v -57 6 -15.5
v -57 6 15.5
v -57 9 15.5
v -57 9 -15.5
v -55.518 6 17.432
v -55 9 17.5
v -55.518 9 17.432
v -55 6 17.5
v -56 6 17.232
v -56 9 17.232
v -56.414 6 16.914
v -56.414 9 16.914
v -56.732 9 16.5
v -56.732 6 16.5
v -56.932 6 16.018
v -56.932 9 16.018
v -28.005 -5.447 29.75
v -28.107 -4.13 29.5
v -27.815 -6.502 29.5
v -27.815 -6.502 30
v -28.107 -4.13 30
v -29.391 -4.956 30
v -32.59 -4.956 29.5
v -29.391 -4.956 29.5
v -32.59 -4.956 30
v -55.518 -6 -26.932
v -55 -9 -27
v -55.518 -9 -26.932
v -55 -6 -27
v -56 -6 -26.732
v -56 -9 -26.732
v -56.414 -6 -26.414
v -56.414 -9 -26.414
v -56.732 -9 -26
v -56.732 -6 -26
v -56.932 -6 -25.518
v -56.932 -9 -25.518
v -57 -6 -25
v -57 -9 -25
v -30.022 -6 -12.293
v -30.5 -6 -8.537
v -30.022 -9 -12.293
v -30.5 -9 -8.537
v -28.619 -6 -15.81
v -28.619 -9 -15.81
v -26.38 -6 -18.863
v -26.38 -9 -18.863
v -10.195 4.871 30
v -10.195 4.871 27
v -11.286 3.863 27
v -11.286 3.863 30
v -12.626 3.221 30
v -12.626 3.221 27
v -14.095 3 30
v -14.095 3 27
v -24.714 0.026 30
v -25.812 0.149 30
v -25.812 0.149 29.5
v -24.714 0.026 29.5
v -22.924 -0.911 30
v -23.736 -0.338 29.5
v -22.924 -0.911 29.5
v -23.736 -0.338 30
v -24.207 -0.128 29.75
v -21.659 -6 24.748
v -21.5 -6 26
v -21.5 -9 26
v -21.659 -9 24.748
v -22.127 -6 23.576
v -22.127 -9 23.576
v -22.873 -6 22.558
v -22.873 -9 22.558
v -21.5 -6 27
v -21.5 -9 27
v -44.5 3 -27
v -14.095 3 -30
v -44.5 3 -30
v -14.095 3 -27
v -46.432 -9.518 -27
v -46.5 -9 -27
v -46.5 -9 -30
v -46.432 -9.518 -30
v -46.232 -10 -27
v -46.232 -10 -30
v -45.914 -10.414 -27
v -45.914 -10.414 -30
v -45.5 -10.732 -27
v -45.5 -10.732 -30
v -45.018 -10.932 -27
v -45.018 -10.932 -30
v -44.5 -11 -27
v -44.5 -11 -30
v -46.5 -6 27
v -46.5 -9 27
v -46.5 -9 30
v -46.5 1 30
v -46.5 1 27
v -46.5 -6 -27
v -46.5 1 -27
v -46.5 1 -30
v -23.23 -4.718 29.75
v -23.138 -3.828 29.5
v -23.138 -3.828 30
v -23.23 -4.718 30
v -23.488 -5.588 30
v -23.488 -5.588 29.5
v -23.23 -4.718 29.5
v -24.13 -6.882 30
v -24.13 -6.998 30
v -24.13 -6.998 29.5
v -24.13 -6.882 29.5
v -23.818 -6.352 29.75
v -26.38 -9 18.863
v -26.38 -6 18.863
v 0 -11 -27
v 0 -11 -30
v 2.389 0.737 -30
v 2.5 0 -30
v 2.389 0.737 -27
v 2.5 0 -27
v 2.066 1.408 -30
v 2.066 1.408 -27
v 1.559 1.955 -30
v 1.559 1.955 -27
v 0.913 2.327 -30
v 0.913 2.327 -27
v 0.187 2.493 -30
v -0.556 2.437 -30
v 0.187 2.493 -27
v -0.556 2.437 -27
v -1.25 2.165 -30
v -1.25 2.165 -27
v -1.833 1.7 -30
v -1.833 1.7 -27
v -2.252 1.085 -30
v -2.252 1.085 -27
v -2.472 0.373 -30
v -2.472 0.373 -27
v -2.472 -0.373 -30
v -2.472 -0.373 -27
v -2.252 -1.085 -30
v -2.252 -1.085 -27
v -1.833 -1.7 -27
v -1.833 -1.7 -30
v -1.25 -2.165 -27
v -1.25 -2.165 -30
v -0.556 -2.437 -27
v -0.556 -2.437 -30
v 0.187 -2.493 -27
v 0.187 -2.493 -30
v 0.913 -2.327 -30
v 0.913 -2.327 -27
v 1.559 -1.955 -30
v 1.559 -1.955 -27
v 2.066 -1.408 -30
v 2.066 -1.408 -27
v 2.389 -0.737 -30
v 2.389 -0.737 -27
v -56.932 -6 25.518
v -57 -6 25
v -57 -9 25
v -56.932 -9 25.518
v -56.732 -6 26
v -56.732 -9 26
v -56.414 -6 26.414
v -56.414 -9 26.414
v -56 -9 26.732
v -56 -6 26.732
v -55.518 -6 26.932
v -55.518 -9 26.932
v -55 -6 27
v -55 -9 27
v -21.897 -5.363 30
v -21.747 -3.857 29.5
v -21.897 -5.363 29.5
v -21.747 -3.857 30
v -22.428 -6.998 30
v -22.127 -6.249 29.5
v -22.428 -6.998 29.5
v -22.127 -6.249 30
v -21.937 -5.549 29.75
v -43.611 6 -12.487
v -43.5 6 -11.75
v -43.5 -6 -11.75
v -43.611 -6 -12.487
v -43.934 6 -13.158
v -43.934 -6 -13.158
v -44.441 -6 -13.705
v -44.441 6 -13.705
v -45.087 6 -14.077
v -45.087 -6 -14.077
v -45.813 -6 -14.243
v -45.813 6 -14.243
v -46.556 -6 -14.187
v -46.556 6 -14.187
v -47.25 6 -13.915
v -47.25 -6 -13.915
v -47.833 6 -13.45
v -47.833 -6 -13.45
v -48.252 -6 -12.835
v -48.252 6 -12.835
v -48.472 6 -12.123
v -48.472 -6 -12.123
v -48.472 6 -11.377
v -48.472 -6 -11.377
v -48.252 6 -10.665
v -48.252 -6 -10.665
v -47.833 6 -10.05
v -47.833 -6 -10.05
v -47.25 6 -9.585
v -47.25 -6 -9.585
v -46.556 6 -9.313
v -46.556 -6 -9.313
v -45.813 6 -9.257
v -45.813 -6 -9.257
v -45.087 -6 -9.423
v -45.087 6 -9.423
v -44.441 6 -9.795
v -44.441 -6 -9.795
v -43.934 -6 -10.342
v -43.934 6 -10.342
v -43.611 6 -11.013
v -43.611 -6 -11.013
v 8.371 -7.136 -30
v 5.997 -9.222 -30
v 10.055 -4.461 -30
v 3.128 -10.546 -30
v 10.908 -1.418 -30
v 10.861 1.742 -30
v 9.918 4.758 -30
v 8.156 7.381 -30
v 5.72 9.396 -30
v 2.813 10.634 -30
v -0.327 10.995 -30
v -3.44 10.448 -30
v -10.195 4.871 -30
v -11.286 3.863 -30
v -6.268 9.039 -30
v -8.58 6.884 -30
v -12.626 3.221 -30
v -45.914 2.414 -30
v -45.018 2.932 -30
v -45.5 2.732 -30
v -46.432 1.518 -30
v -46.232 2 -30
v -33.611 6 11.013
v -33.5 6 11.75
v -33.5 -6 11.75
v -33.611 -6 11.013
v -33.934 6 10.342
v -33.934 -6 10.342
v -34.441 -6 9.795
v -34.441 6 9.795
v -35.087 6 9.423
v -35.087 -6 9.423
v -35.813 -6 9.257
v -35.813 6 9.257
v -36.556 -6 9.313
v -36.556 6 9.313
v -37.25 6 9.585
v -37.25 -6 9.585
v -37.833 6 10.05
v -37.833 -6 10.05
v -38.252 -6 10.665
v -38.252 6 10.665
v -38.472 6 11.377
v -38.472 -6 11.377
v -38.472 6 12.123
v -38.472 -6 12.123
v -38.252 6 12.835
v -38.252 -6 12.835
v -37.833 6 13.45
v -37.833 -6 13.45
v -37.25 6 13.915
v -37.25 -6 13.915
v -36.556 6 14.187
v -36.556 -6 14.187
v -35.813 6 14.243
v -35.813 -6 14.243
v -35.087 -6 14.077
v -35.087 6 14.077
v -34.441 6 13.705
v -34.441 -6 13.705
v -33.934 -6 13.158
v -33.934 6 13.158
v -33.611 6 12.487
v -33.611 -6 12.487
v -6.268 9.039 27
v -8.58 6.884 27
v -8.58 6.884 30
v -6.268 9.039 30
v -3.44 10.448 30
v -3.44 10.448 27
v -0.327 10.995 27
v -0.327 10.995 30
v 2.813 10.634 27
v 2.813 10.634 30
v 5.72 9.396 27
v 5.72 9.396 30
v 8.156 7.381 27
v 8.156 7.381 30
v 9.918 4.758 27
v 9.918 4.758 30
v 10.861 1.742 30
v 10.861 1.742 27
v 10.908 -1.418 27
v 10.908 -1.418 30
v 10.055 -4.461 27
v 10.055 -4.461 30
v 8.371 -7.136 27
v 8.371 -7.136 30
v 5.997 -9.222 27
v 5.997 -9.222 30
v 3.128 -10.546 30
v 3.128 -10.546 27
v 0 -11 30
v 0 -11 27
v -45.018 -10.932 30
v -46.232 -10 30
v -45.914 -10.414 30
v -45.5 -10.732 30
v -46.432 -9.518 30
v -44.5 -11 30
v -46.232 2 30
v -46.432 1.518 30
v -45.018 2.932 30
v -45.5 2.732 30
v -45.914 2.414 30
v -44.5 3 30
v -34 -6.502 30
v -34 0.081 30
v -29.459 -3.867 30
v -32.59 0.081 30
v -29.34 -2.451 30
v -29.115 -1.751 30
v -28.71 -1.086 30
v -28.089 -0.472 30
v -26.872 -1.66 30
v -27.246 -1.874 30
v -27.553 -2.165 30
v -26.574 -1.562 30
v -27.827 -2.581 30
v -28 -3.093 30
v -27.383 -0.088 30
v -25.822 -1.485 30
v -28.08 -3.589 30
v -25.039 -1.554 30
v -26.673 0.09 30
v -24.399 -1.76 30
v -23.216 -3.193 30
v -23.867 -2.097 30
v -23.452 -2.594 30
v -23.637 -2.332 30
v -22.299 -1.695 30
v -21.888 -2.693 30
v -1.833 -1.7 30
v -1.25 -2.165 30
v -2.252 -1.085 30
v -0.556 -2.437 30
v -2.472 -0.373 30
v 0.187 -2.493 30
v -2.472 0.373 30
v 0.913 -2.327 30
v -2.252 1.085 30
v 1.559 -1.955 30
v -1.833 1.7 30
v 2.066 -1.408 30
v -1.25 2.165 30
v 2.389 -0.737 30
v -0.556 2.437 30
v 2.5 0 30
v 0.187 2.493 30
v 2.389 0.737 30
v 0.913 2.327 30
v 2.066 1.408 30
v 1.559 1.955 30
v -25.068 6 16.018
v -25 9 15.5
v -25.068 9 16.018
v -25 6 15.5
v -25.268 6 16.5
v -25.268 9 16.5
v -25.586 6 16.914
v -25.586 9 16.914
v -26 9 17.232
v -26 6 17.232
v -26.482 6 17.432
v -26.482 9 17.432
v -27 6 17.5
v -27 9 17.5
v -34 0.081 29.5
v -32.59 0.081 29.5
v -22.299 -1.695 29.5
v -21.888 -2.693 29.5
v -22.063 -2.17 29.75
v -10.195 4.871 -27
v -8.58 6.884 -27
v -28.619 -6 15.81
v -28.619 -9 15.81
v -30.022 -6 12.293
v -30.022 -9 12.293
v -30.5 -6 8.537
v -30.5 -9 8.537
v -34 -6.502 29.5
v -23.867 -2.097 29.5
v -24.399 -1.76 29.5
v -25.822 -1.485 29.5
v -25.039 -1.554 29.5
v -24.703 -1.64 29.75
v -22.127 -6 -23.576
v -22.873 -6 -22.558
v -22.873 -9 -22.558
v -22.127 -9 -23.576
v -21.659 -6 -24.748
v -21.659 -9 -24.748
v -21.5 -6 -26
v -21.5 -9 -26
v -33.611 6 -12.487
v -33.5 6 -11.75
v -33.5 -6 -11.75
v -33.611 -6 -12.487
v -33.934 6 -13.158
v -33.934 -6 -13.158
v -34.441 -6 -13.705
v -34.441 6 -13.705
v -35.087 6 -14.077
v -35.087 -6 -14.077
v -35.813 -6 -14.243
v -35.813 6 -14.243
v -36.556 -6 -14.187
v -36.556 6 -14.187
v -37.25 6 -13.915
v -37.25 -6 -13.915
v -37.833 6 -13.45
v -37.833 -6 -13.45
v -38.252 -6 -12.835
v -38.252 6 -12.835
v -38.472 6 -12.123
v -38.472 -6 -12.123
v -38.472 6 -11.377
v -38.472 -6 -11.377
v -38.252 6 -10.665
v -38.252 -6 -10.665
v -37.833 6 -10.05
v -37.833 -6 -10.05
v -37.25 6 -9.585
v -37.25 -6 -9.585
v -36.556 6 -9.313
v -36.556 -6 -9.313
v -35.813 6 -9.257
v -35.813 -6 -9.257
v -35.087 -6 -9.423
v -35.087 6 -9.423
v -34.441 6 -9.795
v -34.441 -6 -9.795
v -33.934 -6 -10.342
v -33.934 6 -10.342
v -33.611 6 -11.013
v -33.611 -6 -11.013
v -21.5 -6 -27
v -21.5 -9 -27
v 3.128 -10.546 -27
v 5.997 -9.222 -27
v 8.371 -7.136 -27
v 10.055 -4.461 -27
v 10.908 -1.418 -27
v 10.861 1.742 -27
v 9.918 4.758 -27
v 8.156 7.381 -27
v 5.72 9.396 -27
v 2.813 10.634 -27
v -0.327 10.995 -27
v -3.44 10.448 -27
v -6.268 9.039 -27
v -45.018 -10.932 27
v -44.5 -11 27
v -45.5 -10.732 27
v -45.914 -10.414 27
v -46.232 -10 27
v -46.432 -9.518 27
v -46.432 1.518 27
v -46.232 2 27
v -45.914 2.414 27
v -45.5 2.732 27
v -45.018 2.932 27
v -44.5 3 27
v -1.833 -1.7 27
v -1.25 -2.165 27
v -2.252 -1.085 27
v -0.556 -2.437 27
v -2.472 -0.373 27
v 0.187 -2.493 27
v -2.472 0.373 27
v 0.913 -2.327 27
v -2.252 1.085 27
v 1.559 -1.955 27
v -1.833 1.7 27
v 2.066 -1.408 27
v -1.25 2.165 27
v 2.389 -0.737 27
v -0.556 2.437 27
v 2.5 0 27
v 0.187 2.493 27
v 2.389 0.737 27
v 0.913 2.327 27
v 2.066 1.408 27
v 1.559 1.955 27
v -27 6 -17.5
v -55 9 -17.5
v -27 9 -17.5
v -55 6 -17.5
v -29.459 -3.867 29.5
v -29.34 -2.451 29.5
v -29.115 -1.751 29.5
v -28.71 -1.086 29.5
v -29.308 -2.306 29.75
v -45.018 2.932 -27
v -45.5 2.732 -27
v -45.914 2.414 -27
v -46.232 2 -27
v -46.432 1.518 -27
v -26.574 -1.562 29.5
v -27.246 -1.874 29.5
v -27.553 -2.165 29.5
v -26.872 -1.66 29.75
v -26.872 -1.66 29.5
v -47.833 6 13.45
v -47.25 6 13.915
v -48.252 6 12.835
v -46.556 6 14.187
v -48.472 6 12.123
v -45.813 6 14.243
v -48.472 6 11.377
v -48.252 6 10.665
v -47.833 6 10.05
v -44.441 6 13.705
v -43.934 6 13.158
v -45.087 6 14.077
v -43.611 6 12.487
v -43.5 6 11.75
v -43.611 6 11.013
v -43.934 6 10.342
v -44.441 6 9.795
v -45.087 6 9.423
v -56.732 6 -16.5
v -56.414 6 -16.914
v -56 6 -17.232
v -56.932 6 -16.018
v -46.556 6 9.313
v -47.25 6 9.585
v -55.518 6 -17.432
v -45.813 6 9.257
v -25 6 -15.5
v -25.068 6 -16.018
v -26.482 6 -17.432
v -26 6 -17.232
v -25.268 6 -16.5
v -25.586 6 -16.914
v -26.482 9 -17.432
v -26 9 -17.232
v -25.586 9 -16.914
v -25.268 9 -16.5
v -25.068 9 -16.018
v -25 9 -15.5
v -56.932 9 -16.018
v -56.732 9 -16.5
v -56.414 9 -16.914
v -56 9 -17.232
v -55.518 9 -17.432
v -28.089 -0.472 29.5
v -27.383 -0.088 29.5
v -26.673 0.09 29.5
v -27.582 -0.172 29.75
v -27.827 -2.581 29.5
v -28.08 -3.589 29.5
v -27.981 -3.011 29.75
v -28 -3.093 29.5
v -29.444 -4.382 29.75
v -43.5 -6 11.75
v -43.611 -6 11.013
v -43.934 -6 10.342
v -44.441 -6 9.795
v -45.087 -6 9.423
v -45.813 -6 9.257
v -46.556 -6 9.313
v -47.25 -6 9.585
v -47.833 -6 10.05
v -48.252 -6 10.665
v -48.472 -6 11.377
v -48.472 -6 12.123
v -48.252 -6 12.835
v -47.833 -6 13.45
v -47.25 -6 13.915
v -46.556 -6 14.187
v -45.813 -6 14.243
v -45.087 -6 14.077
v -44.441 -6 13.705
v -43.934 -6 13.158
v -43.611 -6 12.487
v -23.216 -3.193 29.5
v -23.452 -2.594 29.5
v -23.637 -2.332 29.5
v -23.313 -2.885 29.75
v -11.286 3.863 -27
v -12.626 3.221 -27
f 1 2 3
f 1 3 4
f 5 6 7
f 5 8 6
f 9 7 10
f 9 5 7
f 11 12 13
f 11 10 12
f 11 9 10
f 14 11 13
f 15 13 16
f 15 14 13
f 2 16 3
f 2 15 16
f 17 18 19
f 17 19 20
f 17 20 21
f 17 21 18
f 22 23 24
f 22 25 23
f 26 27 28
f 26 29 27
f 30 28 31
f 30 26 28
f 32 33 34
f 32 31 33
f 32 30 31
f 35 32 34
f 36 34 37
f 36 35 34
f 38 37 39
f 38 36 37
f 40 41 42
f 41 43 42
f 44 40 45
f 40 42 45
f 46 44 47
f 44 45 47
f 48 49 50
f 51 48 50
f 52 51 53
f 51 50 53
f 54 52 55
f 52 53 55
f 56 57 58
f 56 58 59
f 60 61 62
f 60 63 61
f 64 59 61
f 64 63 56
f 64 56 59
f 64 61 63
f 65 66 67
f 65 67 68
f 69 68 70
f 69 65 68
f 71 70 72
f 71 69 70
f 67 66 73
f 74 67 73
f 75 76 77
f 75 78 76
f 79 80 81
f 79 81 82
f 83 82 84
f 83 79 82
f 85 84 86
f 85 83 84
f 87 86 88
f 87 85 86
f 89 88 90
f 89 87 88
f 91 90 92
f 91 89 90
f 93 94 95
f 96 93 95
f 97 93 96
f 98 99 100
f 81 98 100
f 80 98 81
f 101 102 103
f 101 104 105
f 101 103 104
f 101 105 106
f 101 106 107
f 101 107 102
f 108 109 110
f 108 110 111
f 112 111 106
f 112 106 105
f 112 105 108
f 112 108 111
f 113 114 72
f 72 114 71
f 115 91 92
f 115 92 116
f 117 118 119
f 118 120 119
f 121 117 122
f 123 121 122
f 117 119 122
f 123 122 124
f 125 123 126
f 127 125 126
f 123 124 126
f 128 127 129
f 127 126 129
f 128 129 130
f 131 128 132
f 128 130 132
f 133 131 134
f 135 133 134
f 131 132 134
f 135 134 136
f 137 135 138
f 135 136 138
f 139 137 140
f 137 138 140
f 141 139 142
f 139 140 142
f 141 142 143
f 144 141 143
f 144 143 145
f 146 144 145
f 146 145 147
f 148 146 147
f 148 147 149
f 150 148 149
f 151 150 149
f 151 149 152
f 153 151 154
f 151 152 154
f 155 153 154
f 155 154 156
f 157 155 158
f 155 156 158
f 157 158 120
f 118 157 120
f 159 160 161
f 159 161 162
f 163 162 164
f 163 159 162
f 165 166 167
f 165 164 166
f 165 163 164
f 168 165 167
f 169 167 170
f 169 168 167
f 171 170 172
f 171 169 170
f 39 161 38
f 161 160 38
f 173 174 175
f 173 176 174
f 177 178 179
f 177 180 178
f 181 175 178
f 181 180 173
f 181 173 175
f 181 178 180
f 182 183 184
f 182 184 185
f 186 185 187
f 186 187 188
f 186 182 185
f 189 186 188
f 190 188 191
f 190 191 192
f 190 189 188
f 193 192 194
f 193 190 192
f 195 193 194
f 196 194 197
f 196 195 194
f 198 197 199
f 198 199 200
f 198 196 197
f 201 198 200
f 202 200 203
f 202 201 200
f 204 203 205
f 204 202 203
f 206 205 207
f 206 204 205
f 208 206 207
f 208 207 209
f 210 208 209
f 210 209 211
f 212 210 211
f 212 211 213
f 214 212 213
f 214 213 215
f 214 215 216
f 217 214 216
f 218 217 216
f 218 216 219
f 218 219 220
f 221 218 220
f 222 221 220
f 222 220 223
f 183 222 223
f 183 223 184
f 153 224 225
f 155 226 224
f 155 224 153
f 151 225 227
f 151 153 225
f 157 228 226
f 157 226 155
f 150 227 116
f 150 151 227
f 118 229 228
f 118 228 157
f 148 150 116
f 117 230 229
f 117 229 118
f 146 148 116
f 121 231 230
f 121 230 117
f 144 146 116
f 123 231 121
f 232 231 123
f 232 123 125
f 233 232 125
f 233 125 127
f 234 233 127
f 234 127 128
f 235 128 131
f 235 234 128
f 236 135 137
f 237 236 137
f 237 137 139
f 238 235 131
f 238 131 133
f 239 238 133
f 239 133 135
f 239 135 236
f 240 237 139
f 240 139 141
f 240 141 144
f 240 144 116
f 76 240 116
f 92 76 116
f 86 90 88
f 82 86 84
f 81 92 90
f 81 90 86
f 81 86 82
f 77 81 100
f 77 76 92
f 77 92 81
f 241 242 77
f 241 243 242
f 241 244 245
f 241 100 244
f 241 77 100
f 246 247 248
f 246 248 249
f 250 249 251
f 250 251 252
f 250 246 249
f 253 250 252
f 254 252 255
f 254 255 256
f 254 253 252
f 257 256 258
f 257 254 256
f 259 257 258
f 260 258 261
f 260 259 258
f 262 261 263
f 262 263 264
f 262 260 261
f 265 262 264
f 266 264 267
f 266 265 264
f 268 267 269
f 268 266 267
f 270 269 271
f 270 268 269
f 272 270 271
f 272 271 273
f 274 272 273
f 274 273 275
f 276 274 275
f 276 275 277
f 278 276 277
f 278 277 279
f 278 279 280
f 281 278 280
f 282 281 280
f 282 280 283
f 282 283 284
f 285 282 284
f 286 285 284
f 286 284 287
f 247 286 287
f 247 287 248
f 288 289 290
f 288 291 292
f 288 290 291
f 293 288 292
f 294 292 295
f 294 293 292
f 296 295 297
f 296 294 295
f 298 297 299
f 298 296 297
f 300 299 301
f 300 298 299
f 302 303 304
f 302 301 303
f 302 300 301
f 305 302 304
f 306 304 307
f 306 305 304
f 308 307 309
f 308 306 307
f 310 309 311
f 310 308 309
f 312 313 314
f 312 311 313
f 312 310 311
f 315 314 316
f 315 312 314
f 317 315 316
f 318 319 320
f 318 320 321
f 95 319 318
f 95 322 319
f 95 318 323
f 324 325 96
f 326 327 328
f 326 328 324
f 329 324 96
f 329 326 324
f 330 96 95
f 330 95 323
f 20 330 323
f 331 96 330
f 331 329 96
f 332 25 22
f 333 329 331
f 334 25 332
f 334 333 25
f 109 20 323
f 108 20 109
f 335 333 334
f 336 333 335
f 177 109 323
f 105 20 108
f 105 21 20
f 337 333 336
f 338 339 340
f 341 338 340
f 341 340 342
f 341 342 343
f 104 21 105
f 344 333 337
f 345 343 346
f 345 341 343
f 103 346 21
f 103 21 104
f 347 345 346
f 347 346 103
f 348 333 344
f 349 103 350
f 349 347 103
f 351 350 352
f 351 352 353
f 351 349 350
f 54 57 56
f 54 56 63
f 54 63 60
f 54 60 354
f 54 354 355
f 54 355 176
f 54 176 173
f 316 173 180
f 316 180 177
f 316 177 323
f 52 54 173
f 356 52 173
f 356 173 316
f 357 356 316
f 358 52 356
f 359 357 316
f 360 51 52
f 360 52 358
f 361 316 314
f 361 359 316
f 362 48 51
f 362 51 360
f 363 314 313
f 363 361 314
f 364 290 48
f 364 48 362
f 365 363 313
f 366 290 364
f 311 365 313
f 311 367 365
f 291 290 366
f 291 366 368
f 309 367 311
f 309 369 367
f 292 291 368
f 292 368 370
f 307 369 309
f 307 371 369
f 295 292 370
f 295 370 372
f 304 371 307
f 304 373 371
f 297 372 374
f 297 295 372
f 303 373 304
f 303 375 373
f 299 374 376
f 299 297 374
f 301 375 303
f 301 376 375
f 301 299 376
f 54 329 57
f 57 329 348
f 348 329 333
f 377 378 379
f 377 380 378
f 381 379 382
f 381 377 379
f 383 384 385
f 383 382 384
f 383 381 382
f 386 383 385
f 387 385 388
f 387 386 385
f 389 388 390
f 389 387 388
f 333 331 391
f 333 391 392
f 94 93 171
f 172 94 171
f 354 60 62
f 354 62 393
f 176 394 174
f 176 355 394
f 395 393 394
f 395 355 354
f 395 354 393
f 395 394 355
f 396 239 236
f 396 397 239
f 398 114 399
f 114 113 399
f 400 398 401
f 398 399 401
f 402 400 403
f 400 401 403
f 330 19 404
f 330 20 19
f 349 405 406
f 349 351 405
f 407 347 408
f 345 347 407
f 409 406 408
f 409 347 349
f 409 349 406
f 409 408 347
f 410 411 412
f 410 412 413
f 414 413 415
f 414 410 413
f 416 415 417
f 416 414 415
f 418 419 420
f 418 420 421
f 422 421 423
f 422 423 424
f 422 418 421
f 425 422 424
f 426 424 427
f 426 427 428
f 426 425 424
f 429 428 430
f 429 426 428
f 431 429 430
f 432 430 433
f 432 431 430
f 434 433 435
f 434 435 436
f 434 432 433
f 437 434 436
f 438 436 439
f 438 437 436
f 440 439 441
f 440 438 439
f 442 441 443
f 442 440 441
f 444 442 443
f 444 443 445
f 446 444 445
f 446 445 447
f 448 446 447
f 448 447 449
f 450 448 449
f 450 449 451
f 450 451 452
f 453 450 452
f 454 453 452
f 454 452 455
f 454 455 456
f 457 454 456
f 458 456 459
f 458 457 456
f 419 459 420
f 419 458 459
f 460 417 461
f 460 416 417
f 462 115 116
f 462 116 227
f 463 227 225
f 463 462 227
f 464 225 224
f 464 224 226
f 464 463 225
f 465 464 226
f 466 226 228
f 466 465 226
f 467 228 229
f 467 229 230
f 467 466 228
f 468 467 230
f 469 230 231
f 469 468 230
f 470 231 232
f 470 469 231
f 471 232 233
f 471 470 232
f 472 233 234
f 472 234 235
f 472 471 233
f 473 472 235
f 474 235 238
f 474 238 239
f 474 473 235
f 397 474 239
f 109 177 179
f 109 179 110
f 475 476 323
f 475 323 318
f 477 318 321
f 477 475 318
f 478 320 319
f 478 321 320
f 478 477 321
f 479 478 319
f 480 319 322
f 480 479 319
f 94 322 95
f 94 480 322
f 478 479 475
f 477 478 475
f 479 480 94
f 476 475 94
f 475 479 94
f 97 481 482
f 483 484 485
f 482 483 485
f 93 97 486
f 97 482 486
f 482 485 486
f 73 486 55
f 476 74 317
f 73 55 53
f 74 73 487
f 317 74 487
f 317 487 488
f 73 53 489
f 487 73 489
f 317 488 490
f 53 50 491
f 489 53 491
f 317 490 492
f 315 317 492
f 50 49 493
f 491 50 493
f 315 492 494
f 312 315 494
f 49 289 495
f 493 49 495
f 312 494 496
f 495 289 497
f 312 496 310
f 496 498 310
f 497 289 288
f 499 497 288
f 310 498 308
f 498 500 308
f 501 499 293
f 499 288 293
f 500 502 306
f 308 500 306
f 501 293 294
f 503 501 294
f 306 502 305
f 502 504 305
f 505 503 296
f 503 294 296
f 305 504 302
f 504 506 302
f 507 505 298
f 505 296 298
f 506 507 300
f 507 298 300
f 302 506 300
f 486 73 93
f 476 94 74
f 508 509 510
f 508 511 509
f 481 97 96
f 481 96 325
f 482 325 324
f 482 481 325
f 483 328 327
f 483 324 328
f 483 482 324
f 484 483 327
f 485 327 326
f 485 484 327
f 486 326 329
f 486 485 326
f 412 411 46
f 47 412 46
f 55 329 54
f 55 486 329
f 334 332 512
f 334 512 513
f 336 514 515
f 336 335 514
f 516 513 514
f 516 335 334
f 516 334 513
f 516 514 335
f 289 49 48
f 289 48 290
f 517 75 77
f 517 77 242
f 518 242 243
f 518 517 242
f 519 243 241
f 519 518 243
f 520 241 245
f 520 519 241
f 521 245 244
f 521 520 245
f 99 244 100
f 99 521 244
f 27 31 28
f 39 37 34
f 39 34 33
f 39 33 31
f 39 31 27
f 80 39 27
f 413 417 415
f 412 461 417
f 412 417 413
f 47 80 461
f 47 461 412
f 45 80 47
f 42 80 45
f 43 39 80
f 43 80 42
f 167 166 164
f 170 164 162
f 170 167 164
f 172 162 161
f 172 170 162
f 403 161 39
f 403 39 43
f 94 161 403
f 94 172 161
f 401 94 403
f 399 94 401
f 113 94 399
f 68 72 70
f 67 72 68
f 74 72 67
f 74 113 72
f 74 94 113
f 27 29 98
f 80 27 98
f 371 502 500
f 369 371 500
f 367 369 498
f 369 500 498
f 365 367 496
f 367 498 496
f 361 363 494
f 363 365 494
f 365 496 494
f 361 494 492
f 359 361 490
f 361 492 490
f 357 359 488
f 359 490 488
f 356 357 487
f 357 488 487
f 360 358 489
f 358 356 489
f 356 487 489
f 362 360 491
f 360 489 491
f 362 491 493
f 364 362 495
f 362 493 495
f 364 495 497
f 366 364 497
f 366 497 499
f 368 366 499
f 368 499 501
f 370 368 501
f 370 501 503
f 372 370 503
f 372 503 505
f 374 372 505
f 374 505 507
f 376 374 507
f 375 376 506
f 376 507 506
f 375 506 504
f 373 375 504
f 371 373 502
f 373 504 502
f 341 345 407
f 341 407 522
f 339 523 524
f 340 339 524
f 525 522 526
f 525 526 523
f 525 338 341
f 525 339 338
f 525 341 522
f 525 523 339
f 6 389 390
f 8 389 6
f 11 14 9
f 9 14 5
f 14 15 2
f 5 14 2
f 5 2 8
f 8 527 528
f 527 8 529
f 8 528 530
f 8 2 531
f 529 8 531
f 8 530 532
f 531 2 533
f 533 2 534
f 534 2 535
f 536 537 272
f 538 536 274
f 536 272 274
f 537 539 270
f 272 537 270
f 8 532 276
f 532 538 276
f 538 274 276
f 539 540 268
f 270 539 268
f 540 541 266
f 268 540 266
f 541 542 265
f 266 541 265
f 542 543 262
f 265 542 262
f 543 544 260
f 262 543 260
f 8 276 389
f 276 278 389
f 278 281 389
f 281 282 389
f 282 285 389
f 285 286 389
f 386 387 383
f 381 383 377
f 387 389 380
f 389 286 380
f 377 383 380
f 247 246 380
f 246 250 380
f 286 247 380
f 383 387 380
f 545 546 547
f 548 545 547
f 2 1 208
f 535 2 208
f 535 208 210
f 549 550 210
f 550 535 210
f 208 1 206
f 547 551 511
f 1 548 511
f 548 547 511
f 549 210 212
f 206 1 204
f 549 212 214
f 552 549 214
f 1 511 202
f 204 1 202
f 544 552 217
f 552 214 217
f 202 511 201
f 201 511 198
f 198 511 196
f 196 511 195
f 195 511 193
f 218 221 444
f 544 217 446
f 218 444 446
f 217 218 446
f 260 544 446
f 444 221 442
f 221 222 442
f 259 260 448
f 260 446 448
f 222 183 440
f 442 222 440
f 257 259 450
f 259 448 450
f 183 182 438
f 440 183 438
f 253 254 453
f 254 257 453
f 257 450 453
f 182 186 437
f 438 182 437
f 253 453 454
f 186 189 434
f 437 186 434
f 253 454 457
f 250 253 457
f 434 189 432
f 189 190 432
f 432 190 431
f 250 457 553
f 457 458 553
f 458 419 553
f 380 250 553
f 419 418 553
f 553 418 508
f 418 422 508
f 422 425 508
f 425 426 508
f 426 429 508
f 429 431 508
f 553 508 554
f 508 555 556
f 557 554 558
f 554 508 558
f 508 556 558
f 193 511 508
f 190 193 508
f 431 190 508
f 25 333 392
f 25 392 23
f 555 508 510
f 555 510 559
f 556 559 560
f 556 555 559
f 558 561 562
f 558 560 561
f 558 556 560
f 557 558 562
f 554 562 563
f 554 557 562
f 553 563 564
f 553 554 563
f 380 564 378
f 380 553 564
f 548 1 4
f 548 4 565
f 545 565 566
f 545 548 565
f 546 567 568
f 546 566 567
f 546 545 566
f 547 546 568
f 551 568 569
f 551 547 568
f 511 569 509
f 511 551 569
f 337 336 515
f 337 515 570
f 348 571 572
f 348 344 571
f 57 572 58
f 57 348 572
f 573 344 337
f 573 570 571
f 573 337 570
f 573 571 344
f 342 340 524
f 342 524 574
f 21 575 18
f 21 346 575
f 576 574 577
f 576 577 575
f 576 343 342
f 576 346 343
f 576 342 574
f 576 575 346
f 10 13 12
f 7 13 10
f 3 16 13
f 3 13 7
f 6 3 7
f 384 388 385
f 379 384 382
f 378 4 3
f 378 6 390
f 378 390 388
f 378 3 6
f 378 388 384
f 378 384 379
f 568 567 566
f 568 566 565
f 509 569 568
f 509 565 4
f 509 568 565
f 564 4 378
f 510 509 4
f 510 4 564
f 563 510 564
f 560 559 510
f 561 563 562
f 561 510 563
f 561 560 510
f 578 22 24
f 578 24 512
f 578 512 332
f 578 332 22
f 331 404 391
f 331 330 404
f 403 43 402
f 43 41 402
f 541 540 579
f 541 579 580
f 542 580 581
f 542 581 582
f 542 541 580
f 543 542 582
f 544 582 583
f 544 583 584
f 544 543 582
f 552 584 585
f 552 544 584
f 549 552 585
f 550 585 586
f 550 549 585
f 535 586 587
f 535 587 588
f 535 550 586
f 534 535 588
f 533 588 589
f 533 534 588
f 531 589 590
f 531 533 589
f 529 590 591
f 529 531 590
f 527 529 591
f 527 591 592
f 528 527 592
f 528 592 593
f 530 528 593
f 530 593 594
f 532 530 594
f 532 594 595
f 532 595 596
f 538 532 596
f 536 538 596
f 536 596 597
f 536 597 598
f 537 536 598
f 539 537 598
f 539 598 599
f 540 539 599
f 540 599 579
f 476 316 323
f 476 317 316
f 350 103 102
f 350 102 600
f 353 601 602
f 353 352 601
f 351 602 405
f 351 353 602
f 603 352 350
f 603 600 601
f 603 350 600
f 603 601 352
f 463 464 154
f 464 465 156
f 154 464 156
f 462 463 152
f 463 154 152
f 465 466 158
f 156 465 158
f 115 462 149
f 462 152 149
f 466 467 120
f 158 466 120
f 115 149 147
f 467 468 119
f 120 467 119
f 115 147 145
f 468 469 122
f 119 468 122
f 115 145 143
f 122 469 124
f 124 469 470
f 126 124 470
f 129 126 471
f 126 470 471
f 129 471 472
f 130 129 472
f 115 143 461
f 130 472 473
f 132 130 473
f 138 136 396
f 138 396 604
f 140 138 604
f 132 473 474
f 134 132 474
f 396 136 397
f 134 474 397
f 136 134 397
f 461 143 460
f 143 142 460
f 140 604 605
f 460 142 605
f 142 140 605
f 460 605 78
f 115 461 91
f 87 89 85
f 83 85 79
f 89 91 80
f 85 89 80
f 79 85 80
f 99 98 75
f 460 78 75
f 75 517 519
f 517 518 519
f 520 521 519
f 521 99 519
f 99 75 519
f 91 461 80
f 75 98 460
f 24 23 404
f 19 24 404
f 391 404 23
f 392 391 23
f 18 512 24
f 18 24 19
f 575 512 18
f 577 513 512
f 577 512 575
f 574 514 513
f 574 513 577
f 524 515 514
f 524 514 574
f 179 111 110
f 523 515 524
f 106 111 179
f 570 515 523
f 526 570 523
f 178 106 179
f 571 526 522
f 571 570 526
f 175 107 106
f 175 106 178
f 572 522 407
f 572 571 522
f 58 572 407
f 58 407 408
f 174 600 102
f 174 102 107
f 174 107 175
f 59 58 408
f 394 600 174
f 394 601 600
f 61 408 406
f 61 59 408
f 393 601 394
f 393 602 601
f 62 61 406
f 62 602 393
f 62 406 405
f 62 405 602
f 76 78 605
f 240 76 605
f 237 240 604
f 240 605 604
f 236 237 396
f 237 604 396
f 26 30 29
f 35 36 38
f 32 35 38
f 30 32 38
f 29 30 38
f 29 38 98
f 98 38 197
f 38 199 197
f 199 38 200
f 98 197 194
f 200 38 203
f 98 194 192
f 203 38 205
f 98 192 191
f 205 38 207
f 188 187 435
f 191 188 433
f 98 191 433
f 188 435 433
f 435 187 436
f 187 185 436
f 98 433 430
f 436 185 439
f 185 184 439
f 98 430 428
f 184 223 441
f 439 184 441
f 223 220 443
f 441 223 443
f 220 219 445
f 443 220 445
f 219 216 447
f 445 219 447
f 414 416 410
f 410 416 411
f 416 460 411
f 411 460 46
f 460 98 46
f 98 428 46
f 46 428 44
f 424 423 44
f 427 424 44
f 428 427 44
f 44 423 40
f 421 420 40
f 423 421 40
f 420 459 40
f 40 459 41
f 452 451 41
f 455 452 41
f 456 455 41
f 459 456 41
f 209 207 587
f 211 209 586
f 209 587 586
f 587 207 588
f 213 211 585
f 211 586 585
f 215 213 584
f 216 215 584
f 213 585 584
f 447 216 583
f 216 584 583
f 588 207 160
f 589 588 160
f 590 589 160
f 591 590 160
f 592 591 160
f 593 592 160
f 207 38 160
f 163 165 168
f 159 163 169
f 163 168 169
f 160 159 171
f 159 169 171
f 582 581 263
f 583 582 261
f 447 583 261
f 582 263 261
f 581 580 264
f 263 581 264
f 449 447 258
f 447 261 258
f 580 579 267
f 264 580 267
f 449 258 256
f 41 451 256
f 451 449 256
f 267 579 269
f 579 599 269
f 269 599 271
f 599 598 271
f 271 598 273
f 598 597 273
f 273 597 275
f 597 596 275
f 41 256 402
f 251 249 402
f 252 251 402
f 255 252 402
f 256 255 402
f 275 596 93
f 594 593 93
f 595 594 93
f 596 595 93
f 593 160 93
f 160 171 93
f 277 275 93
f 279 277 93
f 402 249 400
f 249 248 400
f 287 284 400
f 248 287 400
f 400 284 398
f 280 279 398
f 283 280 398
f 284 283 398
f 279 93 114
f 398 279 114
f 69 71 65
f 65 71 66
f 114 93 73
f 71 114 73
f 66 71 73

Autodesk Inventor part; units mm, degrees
ref_plane "Plano de trabajo1" through (0, 0, 27) normal (0, 0, 1) x (1, 0, 0)
sketch "Boceto1" plane through (0, 0, 27) normal (0, 0, 1) x (1, 0, 0)
  arc A0 (0, -11) -> (-8.5797, 6.8839) centre (0, 0) ccw
  line L0 (0, -11) -> (-44.5, -11)
  line L1 (-46.5, -9) -> (-46.5, 1)
  line L2 (-44.5, 3) -> (-14.0947, 3)
  line L3 (-10.1948, 4.8709) -> (-8.5797, 6.8839)
  arc A1 (-14.0947, 3) -> (-10.1948, 4.8709) centre (-14.0947, 8) ccw
  arc A2 (-44.5, 3) -> (-46.5, 1) centre (-44.5, 1) ccw
  arc A3 (-46.5, -9) -> (-44.5, -11) centre (-44.5, -9) ccw
  circle A4 centre (0, 0) radius 2.5
  point P0 (-46.5, -11)
  point P1 (-46.5, 3)
  point P2 (11, 0)
  dimension "d1" = 22
  dimension "d3" = 5
  dimension "d4" = 14
  dimension "d5" = 57.5
  dimension "d6" = 2
  dimension "d7" = 5
extrude "Extrusión1" add sketch "Boceto1" along normal blind 3
mirror "Simetría1" about plane through (0, 0, 0) normal (0, 0, 1) of "Extrusión1"
ref_plane "Plano de trabajo2" through (-44.5, -6, 27) normal (0, -1, 0) x (1, 0, 0)
sketch "Boceto2" plane through (-44.5, -6, 27) normal (0, -1, 0) x (1, 0, 0)
  line L0 (0, 0) -> (44.5, 0) projected
  line L1 (23, 0) -> (-10.5, 0)
  line L2 (-12.5, -2) -> (-12.5, -52)
  line L3 (-10.5, -54) -> (23, -54)
  line L4 (0, -54) -> (44.5, -54) projected
  line L5 (21.6267, -49.5581) -> (14, -41.5219)
  line L6 (14, -41.5219) -> (14, -12.4781)
  line L7 (14, -12.4781) -> (21.6267, -4.4419)
  line L8 (23, -1) -> (23, 0)
  line L9 (23, -53) -> (23, -54)
  line L10 (0, 3) -> (-2, 3) projected
  line L11 (14, -27) -> (-19.9317, -27) construction
  arc A0 (21.6267, -4.4419) -> (23, -1) centre (18, -1) ccw
  arc A1 (23, -53) -> (21.6267, -49.5581) centre (18, -53) ccw
  arc A2 (-10.5, 0) -> (-12.5, -2) centre (-10.5, -2) ccw
  arc A3 (-12.5, -52) -> (-10.5, -54) centre (-10.5, -52) ccw
  point P0 (44.5, -27)
  point P1 (-12.5, 0)
  point P2 (-12.5, -54)
  point P3 (-1, 3)
  dimension "d11" = 26.5
  dimension "d12" = 11.5
  dimension "d13" = 9
  dimension "d14" = 9
  dimension "d16" = 5
  dimension "d17" = 1
  dimension "d18" = 1
  dimension "d19" = 27
  dimension "d40" = 2
extrude "Extrusión2" add sketch "Boceto2" along normal blind 3
ref_plane "Plano de trabajo3" through (-44.5, 6, 27) normal (0, 1, 0) x (1, 0, 0)
sketch "Boceto3" plane through (-44.5, 6, 27) normal (0, 1, 0) x (1, 0, 0)
  line L0 (-10.5, 44.5) -> (17.5, 44.5)
  line L1 (19.5, 42.5) -> (19.5, 11.5)
  line L2 (17.5, 9.5) -> (-10.5, 9.5)
  line L3 (-12.5, 11.5) -> (-12.5, 42.5)
  line L4 (0, 27) -> (-59, 27) construction
  line L5 (30.4053, 0) -> (0, 0) projected
  arc A0 (-10.5, 44.5) -> (-12.5, 42.5) centre (-10.5, 42.5) ccw
  arc A1 (-12.5, 11.5) -> (-10.5, 9.5) centre (-10.5, 11.5) ccw
  arc A2 (17.5, 9.5) -> (19.5, 11.5) centre (17.5, 11.5) ccw
  arc A3 (19.5, 42.5) -> (17.5, 44.5) centre (17.5, 42.5) ccw
  line L6 (-12.5, 2) -> (-12.5, 52) construction
  point P0 (44.5, 27)
  point P1 (-12.5, 44.5)
  point P2 (19.5, 44.5)
  point P3 (-12.5, 9.5)
  point P4 (-12.5, 27)
  point P5 (-12.5, 0)
  point P6 (-12.5, 54)
  dimension "d23" = 35
  dimension "d24" = 32
  dimension "d25" = 27
  dimension "d26" = 2
extrude "Extrusión3" add sketch "Boceto3" along normal blind 3
sketch "Boceto4" plane through (-44.5, 9, 27) normal (0, 1, 0) x (1, 0, 0)
  line L0 (-12.5, 42.5) -> (-12.5, 11.5) construction
  line L1 (-12.5, 27) -> (20, 27) construction
  circle A0 centre (8.5, 38.75) radius 2.5
  circle A1 centre (-1.5, 38.75) radius 2.5
  line L2 (3.5, 27) -> (3.5, -23) construction
  circle A2 centre (8.5, 15.25) radius 2.5
  circle A3 centre (-1.5, 15.25) radius 2.5
  point P0 (44.5, 27)
  dimension "d29" = 5
  dimension "d30" = 10
  dimension "d31" = 16
  dimension "d32" = 11.75
extrude "Extrusión4" cut sketch "Boceto4" against normal up to surface (18 mm away)
fillet "Empalme1" radius 15 2 edges at (-30.5, -7.5, 14.5219) (-30.5, -7.5, -14.5219)
sketch "Boceto5" plane through (0, 0, 30) normal (0, 0, 1) x (1, 0, 0)
  line L0 (-34, -8) -> (-34, 17.5513) construction
  line L1 (-34, 17.5513) -> (-23.3891, 17.5513) construction
  line L2 (-23.3891, 17.5513) -> (-23.3891, -8) construction
  line L3 (-23.3891, -8) -> (-34, -8) construction
  spline S0 degree 2 poles (-25.812, 0.1491) (-24.9465, 0.1491) (-23.4684, -0.4052) (-22.9238, -0.9109) knots 0 0 0 1 2 2 2
  spline S1 degree 2 poles (-22.9238, -0.9109) (-22.3793, -1.4165) (-21.7472, -2.9238) (-21.7472, -3.8574) knots 0 0 0 1 2 2 2
  spline S2 degree 2 poles (-21.7472, -3.8574) (-21.7472, -4.7131) (-22.1264, -6.3857) (-22.4279, -6.9984) knots 0 0 0 1 2 2 2
  line L4 (-22.4279, -6.9984) -> (-24.1297, -6.9984)
  line L5 (-24.1297, -6.9984) -> (-24.1297, -6.8817)
  spline S3 degree 2 poles (-24.1297, -6.8817) (-23.9935, -6.6969) (-23.6434, -6.0065) (-23.4878, -5.5883) knots 0 0 0 1 2 2 2
  spline S4 degree 2 poles (-23.4878, -5.5883) (-23.3225, -5.1118) (-23.1378, -4.3241) (-23.1378, -3.8282) knots 0 0 0 1 2 2 2
  spline S5 degree 2 poles (-23.1378, -3.8282) (-23.1378, -3.342) (-23.4878, -2.4279) (-23.8671, -2.0972) knots 0 0 0 1 2 2 2
  spline S6 degree 2 poles (-23.8671, -2.0972) (-24.2269, -1.7958) (-25.1799, -1.4846) (-25.8217, -1.4846) knots 0 0 0 1 2 2 2
  spline S7 degree 2 poles (-25.8217, -1.4846) (-26.4635, -1.4846) (-27.2804, -1.8347) (-27.5527, -2.1653) knots 0 0 0 1 2 2 2
  spline S8 degree 2 poles (-27.5527, -2.1653) (-27.8541, -2.5057) (-28.107, -3.517) (-28.107, -4.1297) knots 0 0 0 1 2 2 2
  spline S9 degree 2 poles (-28.107, -4.1297) (-28.107, -4.7909) (-27.9028, -6.1037) (-27.8152, -6.5024) knots 0 0 0 1 2 2 2
  line L6 (-27.8152, -6.5024) -> (-34, -6.5024)
  line L7 (-34, -6.5024) -> (-34, 0.081)
  line L8 (-34, 0.081) -> (-32.59, 0.081)
  line L9 (-32.59, 0.081) -> (-32.59, -4.9562)
  line L10 (-32.59, -4.9562) -> (-29.3906, -4.9562)
  spline S10 degree 2 poles (-29.3906, -4.9562) (-29.4295, -4.6645) (-29.4587, -4.1005) (-29.4587, -3.8671) knots 0 0 0 1 2 2 2
  spline S11 degree 2 poles (-29.4587, -3.8671) (-29.4587, -2.9433) (-29.1572, -1.6694) (-28.7099, -1.0859) knots 0 0 0 1 2 2 2
  spline S12 degree 2 poles (-28.7099, -1.0859) (-28.2626, -0.4927) (-26.9011, 0.1491) (-25.812, 0.1491) knots 0 0 0 1 2 2 2
  point P0 (0, 0)
extrude "Extrusión5" cut sketch "Boceto5" against normal blind 0.5
ref_plane "Plano de trabajo4" through (-44.5, 0, 27) normal (0, -1, 0) x (1, 0, 0)
sketch "Boceto6" plane through (-44.5, 0, 27) normal (0, -1, 0) x (1, 0, 0)
  circle A0 centre (8.5, -15.25) radius 2.5 projected
  circle A1 centre (-1.5, -15.25) radius 2.5 projected
  circle A2 centre (8.5, -38.75) radius 2.5 projected
  circle A3 centre (-1.5, -38.75) radius 2.5 projected
  point P0 (44.5, -27)
extrude "Extrusión6" add sketch "Boceto6" along normal mid plane 18
equation "\"Radio_pliegue\" = Grosor"
equation "\"Anchura_desahogo_plegado\" = Grosor"
equation "\"Profundidad_desahogo_plegado\" = 0.5 * Grosor"
equation "\"Tamaño_destalonado\" = 4 * Grosor"
equation "\"Remanente_mínimo\" = 2 * Grosor"
equation "\"Radiodetransición\" = Radio_pliegue"
equation "\"Tamaño_de_radio_de_Jacobi\" = Radio_pliegue"
equation "\"TamañoSeparación\" = Grosor"
equation "\"Grosor\" = 0.5"
